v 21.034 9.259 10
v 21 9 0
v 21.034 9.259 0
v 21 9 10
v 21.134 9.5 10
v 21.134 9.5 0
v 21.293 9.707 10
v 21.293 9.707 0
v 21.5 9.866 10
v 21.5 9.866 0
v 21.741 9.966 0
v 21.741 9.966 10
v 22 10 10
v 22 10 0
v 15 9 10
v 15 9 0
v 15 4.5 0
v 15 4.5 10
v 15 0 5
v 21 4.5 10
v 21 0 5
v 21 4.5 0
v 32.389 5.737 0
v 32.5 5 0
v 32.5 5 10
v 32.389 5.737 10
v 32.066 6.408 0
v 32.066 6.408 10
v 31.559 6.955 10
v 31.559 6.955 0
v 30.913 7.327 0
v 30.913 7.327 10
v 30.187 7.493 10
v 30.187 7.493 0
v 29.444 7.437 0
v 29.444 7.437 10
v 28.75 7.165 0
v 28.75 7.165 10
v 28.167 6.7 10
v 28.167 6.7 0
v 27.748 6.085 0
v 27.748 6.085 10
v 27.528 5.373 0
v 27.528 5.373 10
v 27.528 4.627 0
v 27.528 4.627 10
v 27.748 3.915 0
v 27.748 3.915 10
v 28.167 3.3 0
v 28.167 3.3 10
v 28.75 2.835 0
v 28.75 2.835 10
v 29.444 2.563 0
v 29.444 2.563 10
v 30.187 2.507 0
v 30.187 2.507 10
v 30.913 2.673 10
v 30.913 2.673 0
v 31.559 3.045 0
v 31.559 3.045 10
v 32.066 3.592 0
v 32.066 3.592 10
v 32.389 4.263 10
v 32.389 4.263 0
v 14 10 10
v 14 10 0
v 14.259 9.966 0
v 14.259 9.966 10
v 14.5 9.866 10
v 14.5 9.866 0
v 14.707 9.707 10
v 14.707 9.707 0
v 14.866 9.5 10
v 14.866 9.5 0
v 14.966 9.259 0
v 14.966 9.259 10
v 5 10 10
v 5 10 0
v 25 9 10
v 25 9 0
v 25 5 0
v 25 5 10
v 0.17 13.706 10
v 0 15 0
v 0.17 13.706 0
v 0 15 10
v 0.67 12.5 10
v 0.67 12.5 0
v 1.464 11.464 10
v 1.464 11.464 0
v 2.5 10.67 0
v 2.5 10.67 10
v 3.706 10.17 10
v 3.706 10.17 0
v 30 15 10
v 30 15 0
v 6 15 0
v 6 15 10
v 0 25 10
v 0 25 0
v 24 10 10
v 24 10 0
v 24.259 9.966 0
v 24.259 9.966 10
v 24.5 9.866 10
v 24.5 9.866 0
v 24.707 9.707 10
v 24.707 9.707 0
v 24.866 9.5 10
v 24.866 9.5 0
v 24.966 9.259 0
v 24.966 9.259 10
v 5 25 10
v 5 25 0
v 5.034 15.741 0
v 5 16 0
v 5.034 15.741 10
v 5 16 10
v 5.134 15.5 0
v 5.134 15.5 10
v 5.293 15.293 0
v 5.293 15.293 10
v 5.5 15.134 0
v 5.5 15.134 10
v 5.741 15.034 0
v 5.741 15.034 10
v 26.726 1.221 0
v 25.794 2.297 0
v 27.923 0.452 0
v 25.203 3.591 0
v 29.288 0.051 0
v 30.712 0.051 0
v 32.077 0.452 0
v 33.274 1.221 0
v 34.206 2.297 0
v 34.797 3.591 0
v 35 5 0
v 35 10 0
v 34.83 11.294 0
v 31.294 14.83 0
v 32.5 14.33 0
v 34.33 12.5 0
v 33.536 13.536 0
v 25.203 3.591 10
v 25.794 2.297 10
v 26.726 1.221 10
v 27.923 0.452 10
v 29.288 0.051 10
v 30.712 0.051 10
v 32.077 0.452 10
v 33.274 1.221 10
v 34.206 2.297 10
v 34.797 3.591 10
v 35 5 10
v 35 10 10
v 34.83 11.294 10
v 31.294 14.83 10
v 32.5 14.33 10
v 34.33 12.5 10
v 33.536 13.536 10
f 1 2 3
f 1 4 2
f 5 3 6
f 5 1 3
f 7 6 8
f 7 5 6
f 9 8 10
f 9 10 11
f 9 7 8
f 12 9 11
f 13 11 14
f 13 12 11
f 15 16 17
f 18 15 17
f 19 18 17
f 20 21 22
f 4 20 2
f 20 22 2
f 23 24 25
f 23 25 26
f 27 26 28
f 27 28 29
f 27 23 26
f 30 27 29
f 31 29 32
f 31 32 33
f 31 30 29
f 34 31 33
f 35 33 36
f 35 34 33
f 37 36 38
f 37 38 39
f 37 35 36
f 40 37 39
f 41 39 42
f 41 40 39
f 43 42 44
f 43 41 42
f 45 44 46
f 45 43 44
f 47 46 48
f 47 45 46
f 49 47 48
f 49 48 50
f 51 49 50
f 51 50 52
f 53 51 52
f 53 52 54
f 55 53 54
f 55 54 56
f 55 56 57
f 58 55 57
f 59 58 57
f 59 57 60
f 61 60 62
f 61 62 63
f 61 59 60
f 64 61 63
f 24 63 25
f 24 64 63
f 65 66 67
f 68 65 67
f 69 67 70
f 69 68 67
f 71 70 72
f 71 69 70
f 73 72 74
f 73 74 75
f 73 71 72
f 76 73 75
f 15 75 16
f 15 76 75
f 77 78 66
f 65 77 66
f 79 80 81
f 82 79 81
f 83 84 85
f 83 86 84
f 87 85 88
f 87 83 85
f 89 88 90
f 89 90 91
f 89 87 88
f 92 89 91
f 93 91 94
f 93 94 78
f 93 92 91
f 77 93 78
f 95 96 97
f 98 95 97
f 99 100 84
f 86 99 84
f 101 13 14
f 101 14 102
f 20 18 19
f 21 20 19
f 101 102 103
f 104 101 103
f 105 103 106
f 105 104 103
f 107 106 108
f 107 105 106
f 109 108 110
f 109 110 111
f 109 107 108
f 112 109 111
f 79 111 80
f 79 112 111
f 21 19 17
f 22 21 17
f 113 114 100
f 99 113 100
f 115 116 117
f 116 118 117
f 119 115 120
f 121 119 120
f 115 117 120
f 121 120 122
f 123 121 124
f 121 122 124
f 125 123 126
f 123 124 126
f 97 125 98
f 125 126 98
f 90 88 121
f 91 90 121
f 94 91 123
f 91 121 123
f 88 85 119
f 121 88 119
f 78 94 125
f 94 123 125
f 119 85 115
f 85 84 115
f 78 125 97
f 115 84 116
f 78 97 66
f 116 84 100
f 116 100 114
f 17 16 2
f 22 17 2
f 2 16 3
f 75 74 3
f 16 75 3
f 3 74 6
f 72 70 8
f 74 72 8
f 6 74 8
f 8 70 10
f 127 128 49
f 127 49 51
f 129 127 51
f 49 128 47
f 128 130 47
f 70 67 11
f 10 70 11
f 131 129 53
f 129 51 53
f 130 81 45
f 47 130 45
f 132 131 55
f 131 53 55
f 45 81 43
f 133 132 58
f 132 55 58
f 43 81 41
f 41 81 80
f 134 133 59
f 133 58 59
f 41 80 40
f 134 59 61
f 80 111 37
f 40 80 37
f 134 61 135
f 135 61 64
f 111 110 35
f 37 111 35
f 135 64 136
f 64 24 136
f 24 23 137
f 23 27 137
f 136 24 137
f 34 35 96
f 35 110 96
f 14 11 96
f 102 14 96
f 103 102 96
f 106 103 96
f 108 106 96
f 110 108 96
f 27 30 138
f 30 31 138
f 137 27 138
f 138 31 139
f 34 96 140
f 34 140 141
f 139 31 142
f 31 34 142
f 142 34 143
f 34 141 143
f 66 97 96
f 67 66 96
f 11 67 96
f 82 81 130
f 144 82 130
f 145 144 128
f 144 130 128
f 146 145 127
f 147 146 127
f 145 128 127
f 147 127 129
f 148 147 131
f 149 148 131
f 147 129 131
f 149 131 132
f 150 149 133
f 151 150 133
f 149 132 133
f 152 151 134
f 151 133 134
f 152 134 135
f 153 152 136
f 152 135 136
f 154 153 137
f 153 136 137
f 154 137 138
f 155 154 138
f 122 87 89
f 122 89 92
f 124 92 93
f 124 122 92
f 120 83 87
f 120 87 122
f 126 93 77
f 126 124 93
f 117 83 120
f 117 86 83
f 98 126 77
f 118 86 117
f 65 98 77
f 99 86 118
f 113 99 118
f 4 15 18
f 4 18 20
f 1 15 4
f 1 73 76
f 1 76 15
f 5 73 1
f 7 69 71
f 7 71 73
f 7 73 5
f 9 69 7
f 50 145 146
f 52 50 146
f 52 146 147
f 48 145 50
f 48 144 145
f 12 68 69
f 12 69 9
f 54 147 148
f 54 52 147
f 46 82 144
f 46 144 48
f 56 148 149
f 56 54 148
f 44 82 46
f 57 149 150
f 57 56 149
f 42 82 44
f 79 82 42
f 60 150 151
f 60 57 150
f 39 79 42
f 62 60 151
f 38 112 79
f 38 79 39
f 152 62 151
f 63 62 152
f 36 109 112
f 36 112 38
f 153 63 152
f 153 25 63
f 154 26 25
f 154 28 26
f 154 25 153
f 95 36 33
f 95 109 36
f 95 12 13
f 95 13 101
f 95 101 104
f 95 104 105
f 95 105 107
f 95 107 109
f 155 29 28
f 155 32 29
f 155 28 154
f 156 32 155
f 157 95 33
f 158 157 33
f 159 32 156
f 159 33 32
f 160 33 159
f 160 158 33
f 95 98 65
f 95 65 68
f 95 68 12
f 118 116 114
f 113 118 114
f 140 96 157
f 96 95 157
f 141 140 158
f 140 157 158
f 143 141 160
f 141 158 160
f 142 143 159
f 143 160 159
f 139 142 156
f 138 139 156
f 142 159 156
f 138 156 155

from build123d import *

# Parameters (mm, degrees)
F0_R     = 2.5
F1_DEPTH = 10
F2_R     = 5
F3_R     = 1
F5_DEPTH = 6


with BuildPart() as f1:
    # F0 (on Top) → F1 (new body)
    with BuildSketch(Plane.XY):
        with BuildLine():
            Line((0, 25), (0, 10))
            Line((0, 10), (15, 10))
            Line((15, 10), (15, 0))
            Line((15, 0), (21, 0))
            Line((21, 0), (21, 10))
            Line((21, 10), (25, 10))
            Line((25, 10), (25, 5))
            ThreePointArc((25, 5), (30, 0), (35, 5))
            Line((35, 5), (35, 15))
            Line((35, 15), (5, 15))
            Line((5, 15), (5, 25))
            Line((5, 25), (0, 25))
        make_face()
        with Locations((30, 5)):
            Circle(F0_R, mode=Mode.SUBTRACT)
    extrude(amount=F1_DEPTH)

    # F2
    f2_edges = [f1.edges().sort_by_distance(p)[0] for p in [
        (0, 10, 5),
        (35, 15, 5),
    ]]
    fillet(f2_edges, radius=F2_R)

    # F3
    f3_edges = [f1.edges().sort_by_distance(p)[0] for p in [
        (15, 10, 5),
        (5, 15, 5),
        (25, 10, 5),
        (21, 10, 5),
    ]]
    fillet(f3_edges, radius=F3_R)

    # F4 (on face) → F5 (cut)
    with BuildSketch(Plane(origin=(15, 0, 0), x_dir=(0, -1, 0), z_dir=(-1, 0, 0))):
        Polygon((-4.5, 10), (0, 5), (0, 10), align=None)
        Polygon((0, 5), (-4.5, 0), (0, 0), align=None)
    extrude(amount=-F5_DEPTH, mode=Mode.SUBTRACT)


solid = f1.part
